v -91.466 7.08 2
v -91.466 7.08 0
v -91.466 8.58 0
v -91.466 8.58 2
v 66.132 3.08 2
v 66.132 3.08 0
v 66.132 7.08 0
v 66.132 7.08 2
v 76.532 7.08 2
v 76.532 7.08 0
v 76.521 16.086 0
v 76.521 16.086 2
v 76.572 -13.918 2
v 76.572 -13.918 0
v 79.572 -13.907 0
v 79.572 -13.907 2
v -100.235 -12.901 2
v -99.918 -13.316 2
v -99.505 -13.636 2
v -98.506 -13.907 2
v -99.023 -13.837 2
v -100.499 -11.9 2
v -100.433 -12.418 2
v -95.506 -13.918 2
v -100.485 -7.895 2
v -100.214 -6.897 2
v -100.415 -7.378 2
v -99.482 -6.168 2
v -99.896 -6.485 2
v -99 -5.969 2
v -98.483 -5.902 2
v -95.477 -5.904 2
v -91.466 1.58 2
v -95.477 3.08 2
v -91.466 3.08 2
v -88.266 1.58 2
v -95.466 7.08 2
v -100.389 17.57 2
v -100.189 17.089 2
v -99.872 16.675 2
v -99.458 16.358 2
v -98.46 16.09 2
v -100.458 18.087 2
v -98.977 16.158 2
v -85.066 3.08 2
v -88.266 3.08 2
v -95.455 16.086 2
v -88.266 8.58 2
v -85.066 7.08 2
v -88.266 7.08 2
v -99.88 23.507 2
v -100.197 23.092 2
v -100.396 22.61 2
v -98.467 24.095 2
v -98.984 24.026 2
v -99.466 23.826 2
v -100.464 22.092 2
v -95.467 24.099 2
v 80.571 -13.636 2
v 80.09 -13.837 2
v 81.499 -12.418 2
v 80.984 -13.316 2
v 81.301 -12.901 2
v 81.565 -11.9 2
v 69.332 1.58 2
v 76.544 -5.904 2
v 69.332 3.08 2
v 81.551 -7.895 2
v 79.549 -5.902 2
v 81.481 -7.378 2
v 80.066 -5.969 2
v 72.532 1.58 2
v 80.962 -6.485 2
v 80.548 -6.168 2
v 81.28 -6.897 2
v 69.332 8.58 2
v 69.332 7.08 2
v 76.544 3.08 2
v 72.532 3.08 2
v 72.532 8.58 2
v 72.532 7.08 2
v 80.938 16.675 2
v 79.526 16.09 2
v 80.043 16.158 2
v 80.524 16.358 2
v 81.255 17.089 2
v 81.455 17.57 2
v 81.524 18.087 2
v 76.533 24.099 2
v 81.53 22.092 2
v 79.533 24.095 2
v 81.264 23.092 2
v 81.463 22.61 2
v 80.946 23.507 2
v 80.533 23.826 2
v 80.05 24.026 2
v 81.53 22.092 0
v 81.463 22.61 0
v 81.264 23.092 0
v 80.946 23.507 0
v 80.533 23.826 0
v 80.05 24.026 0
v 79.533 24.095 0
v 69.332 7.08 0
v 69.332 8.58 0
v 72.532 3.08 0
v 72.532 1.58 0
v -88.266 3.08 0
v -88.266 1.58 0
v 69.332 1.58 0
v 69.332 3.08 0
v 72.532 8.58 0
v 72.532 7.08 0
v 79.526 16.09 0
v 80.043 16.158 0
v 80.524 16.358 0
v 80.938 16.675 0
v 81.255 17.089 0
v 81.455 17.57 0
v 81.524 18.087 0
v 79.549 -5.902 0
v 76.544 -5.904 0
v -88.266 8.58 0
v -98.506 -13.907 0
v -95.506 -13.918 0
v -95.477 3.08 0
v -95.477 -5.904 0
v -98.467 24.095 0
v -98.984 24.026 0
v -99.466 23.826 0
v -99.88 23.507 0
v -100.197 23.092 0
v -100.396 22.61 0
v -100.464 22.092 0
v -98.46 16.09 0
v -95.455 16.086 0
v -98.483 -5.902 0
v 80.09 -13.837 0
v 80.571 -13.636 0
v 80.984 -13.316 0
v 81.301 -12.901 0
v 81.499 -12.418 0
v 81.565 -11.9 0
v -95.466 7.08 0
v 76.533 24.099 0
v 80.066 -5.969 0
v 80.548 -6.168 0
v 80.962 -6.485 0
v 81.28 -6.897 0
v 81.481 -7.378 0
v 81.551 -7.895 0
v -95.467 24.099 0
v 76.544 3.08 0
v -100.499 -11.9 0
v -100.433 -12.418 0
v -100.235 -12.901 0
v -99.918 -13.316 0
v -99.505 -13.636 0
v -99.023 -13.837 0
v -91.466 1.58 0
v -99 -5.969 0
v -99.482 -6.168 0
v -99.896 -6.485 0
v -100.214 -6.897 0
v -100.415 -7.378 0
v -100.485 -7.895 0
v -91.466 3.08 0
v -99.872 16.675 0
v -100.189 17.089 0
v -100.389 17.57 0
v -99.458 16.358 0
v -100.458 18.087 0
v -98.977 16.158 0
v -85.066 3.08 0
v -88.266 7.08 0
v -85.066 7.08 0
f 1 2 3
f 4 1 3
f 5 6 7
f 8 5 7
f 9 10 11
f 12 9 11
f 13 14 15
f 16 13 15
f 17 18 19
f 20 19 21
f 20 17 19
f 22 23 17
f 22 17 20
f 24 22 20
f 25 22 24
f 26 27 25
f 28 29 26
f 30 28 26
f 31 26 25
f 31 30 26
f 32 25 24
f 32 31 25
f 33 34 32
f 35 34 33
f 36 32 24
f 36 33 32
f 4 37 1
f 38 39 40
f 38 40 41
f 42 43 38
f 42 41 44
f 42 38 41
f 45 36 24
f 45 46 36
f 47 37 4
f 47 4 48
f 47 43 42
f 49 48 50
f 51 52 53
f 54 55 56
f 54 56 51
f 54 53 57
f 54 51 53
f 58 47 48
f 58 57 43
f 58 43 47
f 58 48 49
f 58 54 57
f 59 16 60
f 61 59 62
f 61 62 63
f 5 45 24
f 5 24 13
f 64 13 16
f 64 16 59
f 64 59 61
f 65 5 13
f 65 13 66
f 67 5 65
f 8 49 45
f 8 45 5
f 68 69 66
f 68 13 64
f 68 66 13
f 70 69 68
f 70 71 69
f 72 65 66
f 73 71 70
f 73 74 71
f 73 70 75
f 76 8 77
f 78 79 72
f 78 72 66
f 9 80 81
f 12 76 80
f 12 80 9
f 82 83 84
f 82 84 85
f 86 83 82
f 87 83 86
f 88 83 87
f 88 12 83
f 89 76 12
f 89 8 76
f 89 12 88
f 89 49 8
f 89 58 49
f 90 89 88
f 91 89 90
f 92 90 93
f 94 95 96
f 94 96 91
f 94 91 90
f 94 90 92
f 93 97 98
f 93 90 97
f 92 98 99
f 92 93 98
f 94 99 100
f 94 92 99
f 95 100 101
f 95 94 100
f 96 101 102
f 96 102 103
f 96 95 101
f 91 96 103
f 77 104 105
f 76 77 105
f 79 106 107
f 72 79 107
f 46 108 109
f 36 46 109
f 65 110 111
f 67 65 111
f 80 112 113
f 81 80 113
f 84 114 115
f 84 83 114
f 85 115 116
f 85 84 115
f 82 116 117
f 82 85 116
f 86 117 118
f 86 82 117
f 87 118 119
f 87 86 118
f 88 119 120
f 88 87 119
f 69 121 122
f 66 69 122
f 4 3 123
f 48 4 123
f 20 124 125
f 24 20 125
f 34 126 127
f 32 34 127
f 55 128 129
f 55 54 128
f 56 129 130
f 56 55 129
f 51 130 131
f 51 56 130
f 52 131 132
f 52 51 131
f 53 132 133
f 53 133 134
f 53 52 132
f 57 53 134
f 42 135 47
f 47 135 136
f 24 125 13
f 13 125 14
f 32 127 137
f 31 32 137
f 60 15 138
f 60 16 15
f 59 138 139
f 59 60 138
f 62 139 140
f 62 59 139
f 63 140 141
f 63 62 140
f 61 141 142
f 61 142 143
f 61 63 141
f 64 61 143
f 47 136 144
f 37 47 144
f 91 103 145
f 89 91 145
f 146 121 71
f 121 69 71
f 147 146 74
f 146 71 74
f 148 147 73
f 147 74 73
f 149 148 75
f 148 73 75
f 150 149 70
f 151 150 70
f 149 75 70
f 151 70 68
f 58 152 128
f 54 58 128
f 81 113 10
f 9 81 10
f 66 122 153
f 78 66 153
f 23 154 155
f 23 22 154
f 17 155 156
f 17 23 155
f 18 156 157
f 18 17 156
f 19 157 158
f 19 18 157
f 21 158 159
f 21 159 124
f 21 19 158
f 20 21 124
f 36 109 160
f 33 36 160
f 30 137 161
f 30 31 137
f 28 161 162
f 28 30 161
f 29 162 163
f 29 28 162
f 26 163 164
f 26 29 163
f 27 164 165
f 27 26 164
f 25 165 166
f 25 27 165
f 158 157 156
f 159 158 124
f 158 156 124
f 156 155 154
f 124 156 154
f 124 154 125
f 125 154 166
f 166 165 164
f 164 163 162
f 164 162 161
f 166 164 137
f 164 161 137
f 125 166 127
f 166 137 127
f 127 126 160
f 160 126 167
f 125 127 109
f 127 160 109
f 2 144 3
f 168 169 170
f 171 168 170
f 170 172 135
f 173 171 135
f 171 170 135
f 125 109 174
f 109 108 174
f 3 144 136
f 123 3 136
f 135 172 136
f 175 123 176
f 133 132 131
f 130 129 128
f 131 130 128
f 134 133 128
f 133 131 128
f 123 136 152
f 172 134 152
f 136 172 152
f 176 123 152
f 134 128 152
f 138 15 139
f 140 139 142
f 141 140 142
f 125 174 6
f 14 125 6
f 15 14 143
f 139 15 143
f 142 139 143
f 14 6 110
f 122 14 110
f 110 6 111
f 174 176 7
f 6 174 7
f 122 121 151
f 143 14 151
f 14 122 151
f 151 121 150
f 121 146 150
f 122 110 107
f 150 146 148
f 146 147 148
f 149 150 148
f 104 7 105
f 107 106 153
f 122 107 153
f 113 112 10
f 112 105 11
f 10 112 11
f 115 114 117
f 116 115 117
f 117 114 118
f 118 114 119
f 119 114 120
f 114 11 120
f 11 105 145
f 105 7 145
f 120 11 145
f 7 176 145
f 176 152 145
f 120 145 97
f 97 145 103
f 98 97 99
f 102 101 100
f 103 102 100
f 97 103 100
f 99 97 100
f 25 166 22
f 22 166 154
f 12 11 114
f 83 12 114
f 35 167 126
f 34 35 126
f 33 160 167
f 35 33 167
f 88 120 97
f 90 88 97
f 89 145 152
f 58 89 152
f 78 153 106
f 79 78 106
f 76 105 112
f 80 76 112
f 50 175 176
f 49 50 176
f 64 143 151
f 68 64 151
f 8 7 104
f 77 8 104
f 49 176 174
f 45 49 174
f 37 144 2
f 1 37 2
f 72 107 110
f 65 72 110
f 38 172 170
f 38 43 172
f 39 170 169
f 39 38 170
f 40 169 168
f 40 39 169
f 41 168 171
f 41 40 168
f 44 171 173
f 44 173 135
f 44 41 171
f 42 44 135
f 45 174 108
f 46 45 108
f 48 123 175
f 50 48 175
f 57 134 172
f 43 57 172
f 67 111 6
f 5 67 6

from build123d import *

# Parameters (mm, degrees)
EXTRUDE_1_DEPTH = 2
FILLET_1_R      = 2


with BuildPart() as part:
    # 草图1 → 凸台-拉伸1 (new body)
    with BuildSketch(Plane.XY):
        Polygon((81.543574606, -5.900283983), (76.543576359, -5.904470333), (76.543576359, 3.08), (72.531874134, 3.08), (72.531874134, 1.58), (69.331874134, 1.58), (69.331874134, 3.08), (66.131874134, 3.08), (66.131874134, 7.08), (69.331874134, 7.08), (69.331874134, 8.58), (72.531874134, 8.58), (72.531874134, 7.08), (76.531874134, 7.08), (76.520862712, 16.085955117), (81.520858939, 16.092097641), (81.533074683, 24.092088314), (76.533079924, 24.099327787), (-95.466920076, 24.099327787), (-100.466914835, 24.092088314), (-100.454699091, 16.092097641), (-95.454702864, 16.085955117), (-95.465714286, 7.08), (-91.465714286, 7.08), (-91.465714286, 8.58), (-88.265714286, 8.58), (-88.265714286, 7.08), (-85.065714286, 7.08), (-85.065714286, 3.08), (-88.265714286, 3.08), (-88.265714286, 1.58), (-91.465714286, 1.58), (-91.465714286, 3.08), (-95.47741651, 3.08), (-95.47741651, -5.904470333), (-100.477414758, -5.900283983), (-100.506156647, -13.900232352), (-95.506187511, -13.917800667), (76.57234736, -13.917800667), (81.572316495, -13.900232352), align=None)
    extrude(amount=EXTRUDE_1_DEPTH)

    # 圆角1
    fillet_1_edges = [part.edges().sort_by_distance(p)[0] for p in [
        (-100.506156647, -13.900232352, 1),
        (-100.477414758, -5.900283983, 1),
        (-100.454699091, 16.092097641, 1),
        (-100.466914835, 24.092088314, 1),
        (81.533074683, 24.092088314, 1),
        (81.520858939, 16.092097641, 1),
        (81.543574606, -5.900283983, 1),
        (81.572316495, -13.900232352, 1),
    ]]
    fillet(fillet_1_edges, radius=FILLET_1_R)


solid = part.part
